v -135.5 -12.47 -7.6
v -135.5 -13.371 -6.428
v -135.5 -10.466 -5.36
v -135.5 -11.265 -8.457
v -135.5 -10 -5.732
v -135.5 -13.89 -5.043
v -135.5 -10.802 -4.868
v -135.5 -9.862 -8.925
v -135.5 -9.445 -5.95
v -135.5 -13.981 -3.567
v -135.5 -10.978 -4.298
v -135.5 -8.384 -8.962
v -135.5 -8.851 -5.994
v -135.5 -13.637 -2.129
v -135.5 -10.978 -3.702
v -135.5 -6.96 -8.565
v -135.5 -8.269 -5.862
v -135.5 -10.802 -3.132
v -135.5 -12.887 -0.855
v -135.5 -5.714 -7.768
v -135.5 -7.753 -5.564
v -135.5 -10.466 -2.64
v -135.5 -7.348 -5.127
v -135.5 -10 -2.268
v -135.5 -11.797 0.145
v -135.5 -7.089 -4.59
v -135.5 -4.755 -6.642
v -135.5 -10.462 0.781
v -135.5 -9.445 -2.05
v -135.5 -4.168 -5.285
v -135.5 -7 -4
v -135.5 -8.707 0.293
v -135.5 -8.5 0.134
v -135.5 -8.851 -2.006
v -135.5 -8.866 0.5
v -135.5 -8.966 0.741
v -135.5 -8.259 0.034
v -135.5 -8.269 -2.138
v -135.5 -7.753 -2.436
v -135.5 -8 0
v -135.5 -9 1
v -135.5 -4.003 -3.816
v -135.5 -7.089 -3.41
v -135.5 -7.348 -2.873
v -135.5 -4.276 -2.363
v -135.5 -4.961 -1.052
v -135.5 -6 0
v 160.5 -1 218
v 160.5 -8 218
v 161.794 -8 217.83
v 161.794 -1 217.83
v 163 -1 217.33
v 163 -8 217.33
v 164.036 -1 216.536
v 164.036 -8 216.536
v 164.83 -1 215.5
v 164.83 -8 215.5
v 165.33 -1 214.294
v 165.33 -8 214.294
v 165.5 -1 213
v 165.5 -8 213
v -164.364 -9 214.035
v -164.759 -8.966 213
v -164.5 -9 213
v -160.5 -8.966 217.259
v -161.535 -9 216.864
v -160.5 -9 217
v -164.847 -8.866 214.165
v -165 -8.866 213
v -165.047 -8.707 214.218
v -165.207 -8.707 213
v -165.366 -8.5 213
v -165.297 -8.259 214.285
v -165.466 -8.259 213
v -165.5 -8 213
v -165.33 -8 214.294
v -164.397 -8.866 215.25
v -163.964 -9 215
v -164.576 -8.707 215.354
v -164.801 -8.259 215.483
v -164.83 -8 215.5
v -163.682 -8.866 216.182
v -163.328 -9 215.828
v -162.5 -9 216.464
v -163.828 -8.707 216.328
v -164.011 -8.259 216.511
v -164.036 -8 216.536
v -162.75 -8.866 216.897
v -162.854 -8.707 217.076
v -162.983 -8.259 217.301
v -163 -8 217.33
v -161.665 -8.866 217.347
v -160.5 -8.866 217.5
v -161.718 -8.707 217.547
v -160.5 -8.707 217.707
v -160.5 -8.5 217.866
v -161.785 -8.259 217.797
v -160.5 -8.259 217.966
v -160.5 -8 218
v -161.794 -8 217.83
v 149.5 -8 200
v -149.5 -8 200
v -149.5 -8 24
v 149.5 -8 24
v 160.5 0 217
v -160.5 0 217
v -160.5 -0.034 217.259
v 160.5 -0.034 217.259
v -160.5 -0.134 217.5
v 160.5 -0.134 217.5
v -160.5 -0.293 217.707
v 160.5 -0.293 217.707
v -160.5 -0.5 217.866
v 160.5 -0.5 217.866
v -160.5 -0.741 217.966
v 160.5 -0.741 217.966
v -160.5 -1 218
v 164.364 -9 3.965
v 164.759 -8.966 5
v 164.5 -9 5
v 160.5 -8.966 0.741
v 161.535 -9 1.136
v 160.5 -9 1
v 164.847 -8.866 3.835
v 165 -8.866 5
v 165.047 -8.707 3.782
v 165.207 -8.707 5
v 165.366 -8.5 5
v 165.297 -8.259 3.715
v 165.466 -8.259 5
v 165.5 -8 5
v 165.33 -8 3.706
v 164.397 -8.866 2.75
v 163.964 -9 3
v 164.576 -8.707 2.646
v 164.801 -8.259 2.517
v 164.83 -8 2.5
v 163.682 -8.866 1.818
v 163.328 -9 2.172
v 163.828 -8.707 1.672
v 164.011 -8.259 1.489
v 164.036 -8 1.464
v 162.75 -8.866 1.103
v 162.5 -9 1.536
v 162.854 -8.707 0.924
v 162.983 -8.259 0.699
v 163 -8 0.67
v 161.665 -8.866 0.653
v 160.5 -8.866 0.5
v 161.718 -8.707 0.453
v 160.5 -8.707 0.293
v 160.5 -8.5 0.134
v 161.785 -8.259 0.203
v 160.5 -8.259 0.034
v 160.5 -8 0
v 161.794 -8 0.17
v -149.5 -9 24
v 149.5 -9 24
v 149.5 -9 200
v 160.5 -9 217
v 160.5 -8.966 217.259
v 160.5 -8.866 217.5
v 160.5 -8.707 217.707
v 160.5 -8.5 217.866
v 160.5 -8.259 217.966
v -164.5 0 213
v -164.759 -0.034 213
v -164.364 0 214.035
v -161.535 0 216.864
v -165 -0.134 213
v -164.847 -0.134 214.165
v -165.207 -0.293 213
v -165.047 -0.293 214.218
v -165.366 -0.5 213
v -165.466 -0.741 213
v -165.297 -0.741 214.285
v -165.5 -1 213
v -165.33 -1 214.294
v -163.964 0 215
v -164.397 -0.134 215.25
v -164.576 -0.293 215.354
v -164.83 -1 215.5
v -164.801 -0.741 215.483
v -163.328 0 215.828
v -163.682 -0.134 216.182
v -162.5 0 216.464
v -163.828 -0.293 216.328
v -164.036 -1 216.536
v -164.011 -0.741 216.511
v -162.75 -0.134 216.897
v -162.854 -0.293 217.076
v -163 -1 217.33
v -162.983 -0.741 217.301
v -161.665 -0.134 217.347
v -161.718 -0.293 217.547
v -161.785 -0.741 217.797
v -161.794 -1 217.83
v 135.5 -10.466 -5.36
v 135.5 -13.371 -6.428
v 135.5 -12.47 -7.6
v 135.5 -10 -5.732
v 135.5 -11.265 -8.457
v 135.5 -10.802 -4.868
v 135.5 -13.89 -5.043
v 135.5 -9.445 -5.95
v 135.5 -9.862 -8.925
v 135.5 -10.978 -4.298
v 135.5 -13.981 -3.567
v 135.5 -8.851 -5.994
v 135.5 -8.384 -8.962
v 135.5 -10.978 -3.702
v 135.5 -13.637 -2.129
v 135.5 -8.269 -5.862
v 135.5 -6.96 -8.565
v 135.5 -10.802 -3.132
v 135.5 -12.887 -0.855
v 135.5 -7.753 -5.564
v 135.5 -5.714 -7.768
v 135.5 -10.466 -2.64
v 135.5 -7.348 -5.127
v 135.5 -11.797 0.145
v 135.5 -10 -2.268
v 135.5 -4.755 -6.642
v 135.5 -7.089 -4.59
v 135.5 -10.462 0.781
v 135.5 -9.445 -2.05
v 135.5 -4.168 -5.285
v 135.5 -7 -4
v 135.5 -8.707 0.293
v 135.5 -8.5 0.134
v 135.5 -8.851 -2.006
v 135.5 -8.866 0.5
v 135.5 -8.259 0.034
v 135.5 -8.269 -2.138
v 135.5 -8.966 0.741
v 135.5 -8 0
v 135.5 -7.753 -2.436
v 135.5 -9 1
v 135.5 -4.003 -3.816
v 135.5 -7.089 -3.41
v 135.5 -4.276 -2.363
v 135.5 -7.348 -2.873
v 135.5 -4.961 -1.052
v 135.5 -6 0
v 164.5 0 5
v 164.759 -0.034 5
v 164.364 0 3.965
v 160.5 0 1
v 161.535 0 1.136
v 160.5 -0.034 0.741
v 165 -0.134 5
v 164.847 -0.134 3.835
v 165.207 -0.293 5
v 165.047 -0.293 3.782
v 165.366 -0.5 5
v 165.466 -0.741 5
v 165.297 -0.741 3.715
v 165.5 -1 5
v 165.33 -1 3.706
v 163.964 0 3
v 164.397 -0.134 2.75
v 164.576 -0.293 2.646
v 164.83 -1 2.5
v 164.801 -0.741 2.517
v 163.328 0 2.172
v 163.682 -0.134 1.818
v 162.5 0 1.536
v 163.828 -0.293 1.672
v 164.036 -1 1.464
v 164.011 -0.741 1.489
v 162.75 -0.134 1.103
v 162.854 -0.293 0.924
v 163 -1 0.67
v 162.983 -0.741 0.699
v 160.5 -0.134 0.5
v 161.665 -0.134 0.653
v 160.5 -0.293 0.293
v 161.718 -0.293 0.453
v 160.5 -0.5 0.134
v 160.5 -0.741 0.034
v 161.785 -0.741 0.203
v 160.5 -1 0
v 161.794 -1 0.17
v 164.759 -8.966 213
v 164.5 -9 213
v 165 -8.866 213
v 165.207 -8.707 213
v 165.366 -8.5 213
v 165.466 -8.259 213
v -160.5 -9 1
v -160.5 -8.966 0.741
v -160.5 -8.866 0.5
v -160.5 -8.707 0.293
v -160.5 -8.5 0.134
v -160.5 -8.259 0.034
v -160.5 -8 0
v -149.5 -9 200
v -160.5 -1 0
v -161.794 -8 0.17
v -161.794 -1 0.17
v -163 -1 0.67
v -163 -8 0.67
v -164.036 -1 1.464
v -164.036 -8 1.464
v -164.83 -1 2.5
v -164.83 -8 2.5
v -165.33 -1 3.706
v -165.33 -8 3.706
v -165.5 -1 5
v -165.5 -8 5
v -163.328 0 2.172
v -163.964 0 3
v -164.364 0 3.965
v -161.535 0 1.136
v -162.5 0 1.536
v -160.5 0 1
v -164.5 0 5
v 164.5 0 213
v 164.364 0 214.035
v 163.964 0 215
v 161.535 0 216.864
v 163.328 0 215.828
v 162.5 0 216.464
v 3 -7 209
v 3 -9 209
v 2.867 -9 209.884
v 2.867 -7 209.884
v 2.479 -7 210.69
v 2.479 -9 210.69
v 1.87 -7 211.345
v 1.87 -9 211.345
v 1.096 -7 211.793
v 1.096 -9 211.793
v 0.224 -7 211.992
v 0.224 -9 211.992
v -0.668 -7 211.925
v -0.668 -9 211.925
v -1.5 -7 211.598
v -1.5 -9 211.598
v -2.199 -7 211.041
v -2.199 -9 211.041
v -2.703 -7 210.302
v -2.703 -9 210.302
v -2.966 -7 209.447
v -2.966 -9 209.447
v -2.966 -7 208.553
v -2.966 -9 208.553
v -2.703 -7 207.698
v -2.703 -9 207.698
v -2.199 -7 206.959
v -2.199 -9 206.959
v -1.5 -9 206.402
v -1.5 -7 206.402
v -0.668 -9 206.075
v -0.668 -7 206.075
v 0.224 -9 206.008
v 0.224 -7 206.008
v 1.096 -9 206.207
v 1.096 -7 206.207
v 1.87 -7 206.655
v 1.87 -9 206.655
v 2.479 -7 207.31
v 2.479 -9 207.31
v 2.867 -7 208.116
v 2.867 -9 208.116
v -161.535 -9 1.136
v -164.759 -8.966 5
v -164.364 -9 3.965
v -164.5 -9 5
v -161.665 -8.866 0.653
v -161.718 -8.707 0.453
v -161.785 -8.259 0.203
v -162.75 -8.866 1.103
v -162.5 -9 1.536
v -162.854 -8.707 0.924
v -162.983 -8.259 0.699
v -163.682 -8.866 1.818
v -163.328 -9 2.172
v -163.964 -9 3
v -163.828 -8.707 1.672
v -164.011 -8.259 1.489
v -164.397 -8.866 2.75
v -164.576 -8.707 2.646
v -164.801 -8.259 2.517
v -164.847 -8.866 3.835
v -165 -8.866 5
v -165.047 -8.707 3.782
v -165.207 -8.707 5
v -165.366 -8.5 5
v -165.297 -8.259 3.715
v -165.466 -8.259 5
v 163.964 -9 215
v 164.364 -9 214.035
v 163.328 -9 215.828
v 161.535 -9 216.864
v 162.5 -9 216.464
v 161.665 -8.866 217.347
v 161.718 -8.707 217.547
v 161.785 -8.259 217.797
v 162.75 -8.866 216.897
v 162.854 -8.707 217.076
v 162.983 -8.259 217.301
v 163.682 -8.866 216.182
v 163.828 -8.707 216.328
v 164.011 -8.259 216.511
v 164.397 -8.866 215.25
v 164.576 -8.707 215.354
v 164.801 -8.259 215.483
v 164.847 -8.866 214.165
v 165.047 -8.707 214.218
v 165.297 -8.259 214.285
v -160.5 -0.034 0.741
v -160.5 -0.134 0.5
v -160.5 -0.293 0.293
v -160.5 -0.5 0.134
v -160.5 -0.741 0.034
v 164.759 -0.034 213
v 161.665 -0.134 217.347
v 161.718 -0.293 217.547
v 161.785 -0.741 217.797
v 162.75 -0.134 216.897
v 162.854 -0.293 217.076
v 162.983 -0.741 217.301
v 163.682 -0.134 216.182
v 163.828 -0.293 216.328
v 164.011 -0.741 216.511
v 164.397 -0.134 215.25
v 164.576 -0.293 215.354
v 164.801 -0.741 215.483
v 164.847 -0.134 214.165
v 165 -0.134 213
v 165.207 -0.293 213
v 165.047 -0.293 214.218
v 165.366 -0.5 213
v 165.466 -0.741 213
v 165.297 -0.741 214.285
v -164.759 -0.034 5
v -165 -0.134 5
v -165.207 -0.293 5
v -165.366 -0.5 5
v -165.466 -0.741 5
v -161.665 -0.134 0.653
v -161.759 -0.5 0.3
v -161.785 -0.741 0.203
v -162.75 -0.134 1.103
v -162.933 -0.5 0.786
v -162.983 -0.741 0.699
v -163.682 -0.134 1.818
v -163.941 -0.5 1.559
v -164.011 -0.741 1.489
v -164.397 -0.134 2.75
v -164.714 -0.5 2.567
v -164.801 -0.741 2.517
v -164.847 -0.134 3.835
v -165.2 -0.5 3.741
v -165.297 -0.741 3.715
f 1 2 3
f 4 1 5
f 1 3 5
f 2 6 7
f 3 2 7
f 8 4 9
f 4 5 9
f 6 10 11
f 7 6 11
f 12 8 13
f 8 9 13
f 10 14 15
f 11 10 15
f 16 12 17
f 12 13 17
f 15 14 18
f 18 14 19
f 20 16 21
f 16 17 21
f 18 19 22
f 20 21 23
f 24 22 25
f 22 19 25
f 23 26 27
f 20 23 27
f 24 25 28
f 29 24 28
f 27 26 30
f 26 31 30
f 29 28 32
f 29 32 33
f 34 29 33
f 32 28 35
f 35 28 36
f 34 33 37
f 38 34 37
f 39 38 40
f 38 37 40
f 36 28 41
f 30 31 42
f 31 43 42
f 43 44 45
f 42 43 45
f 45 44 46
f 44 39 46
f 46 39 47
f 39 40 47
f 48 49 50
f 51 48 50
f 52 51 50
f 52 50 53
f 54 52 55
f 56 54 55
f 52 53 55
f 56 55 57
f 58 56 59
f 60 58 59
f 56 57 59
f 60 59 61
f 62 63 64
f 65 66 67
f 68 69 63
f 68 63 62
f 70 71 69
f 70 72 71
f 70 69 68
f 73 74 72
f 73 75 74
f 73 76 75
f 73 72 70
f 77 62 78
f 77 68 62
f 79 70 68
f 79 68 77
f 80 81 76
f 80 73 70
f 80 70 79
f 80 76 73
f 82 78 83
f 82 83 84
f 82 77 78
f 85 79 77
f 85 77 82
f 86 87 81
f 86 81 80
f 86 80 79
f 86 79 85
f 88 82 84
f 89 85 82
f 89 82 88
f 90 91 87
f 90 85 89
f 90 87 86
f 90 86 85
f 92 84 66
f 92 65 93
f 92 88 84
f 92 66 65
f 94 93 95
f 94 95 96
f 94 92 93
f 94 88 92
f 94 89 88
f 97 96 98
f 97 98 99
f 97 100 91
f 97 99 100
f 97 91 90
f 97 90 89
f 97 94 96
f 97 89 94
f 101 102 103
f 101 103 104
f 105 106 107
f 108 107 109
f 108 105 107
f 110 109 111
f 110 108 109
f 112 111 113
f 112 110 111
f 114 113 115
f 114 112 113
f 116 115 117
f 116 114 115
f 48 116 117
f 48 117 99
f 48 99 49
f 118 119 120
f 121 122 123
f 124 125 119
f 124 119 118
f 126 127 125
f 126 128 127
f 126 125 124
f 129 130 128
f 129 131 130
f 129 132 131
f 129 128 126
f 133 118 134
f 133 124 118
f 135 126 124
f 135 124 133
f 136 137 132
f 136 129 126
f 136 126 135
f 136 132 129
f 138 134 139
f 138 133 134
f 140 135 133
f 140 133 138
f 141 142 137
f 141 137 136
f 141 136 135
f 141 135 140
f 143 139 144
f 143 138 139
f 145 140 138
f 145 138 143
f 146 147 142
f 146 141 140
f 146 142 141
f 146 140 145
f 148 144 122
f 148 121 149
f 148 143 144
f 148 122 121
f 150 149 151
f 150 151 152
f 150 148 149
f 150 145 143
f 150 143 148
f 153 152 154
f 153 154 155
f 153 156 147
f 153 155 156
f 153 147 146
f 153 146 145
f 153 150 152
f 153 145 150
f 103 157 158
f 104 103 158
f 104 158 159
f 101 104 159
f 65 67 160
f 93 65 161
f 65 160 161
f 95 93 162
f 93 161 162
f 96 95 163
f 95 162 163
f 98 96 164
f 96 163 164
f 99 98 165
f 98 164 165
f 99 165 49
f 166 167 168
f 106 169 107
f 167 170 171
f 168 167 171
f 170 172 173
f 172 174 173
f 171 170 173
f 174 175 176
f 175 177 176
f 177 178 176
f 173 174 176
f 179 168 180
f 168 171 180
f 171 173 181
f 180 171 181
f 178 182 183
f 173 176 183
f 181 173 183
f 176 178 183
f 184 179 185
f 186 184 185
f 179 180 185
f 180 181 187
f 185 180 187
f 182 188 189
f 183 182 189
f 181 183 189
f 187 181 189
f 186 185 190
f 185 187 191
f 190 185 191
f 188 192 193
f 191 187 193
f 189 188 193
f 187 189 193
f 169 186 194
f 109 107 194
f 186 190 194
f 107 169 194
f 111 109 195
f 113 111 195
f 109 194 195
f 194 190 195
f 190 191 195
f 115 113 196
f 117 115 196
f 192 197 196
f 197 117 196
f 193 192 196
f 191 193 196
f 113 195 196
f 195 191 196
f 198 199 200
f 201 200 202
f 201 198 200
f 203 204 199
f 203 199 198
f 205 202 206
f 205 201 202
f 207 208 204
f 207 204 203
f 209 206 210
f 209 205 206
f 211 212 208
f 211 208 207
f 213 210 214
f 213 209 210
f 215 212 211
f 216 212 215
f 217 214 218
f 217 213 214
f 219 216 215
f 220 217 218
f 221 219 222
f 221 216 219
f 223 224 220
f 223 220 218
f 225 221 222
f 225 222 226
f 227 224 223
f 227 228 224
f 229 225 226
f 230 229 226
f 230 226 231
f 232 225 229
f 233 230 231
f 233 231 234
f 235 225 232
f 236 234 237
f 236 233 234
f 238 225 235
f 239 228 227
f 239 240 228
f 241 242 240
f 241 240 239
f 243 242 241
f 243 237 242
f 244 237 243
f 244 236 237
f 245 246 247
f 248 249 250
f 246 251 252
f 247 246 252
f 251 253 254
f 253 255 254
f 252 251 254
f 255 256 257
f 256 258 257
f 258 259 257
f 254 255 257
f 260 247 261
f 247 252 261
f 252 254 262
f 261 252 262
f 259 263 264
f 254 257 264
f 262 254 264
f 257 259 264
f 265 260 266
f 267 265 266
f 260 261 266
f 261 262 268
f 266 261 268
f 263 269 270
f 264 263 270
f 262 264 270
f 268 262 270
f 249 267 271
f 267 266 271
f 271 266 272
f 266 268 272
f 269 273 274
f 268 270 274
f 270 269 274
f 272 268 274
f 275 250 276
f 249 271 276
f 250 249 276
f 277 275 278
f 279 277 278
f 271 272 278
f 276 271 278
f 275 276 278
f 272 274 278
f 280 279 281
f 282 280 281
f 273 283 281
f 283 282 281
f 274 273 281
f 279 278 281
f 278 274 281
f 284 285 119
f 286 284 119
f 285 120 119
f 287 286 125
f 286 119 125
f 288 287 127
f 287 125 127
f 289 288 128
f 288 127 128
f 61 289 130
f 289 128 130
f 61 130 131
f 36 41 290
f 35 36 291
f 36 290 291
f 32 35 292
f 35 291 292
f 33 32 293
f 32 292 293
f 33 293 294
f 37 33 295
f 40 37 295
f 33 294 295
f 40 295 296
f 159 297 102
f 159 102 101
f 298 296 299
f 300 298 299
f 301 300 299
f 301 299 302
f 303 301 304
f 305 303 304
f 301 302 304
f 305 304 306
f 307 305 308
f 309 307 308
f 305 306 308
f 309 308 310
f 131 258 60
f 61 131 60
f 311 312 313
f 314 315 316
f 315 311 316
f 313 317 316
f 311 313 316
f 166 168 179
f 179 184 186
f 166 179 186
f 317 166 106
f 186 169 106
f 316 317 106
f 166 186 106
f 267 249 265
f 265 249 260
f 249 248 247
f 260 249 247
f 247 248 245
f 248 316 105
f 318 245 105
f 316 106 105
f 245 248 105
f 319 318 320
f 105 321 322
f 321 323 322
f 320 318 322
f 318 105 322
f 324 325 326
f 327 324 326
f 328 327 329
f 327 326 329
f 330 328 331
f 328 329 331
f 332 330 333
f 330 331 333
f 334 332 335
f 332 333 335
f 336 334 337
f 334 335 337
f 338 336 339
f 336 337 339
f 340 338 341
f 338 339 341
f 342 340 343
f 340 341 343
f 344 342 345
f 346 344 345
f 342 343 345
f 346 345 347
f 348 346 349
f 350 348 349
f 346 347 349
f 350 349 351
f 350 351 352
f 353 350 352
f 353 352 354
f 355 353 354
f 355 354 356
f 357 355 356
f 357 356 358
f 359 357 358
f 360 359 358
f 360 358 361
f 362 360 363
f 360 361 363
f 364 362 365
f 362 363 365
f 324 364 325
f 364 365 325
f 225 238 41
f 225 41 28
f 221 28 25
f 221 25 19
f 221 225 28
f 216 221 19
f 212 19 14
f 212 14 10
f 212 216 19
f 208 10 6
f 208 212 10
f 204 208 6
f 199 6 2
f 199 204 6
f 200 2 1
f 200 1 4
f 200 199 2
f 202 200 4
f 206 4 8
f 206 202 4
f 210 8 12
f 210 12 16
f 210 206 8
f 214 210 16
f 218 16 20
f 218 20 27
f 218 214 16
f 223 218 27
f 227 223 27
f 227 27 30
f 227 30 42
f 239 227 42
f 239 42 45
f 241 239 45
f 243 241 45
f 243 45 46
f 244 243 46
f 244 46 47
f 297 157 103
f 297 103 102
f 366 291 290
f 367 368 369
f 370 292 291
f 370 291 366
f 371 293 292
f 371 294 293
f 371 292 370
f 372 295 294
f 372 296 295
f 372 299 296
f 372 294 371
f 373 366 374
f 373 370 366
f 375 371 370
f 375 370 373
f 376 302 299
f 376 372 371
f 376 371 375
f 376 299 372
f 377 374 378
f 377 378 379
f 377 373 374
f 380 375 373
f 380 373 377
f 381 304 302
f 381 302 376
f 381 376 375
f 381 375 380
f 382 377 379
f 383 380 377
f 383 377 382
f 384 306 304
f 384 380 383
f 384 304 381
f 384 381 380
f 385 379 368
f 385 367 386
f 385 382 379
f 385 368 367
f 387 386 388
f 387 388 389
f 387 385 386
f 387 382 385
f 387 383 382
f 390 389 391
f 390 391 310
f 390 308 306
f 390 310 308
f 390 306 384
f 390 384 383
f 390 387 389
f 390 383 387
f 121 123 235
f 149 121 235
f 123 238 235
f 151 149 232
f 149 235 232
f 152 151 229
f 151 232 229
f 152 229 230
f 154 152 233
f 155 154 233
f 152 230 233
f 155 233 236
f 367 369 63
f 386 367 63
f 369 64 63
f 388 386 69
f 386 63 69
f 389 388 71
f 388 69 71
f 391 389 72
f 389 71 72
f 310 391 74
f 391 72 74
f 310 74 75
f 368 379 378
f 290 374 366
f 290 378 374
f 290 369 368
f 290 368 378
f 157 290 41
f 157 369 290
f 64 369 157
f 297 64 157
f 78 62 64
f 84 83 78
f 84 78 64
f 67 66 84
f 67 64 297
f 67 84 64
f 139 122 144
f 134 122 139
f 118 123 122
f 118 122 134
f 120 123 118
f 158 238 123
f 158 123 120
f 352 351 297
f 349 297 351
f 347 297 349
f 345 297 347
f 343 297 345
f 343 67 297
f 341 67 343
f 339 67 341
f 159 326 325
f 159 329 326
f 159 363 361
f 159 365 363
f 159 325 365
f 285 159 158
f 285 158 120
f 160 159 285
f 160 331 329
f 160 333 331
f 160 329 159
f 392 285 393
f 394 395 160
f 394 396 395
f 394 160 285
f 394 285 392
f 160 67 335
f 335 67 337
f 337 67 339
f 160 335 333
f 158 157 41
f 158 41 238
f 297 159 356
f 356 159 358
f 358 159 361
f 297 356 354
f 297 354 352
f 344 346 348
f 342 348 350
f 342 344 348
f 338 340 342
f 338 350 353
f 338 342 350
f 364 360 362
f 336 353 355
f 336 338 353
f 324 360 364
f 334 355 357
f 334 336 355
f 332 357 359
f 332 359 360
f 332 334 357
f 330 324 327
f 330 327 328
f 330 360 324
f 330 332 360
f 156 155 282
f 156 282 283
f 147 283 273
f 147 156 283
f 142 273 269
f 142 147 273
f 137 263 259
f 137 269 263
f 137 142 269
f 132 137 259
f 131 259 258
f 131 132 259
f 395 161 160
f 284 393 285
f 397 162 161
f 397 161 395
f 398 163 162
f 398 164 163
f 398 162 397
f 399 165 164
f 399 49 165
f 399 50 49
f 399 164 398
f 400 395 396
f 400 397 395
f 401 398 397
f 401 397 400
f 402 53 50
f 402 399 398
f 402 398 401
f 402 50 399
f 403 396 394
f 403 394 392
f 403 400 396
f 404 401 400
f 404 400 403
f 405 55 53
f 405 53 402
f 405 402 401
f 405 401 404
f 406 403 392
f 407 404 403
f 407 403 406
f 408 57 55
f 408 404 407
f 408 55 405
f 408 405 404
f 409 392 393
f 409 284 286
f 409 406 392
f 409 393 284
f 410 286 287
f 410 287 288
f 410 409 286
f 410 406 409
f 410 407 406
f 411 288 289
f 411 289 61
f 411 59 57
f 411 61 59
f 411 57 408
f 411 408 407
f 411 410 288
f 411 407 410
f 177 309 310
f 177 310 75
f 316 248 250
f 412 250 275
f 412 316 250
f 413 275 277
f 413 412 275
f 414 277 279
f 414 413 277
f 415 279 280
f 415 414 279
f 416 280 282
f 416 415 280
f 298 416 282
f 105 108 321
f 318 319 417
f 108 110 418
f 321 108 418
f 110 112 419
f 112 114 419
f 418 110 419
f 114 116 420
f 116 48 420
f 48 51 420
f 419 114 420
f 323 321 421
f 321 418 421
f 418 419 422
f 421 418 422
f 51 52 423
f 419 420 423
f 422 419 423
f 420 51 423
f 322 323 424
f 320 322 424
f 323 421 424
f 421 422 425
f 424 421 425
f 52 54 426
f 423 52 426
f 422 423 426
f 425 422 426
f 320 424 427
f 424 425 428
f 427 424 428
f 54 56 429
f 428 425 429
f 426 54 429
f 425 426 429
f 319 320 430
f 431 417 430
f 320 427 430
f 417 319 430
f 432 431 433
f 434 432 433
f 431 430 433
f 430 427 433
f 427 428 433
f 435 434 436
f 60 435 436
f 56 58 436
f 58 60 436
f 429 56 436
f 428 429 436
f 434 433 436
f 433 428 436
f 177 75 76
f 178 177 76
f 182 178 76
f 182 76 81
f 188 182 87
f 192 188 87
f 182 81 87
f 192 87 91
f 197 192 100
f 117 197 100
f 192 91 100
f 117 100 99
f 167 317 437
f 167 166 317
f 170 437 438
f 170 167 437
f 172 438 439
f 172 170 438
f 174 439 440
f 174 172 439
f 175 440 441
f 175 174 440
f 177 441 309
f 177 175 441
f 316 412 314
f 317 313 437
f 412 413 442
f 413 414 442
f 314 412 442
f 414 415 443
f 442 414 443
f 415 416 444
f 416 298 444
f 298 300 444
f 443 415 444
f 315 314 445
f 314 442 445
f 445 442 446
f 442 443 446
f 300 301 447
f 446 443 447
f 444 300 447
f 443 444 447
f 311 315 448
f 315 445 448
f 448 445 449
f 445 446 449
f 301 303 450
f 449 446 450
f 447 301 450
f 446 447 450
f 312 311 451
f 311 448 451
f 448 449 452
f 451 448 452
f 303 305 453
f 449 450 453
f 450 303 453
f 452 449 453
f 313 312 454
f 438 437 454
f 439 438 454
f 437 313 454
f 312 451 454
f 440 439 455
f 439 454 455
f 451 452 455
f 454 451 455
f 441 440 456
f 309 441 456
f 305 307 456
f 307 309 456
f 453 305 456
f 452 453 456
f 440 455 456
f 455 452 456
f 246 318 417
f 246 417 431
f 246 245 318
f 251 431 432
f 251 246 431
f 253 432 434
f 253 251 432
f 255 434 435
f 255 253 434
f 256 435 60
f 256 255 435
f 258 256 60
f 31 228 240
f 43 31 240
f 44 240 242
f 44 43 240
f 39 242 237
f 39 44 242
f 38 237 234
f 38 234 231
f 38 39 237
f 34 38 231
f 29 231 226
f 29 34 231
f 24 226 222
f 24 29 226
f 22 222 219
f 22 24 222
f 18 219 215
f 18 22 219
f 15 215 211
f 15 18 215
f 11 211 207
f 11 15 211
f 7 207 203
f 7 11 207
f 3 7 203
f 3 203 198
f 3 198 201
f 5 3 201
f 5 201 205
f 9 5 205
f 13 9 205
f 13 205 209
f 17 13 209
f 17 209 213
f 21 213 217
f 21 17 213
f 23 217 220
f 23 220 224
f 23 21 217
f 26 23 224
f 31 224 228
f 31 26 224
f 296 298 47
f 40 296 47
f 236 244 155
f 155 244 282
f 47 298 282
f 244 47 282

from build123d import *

# Parameters (mm, degrees)
F0_W     = 331
F0_H     = 218
F1_DEPTH = 9
F2_W     = 299
F2_H     = 176
F3_DEPTH = 1
F4_R     = 3
F5_DEPTH = 2
F6_R     = 5
F6_R_2   = 2
F7_DEPTH = 135.5
F8_R     = 5
F9_R     = 1


with BuildPart() as f1:
    # F0 (on Front) → F1 (new body)
    with BuildSketch(Plane.XZ):
        with Locations((0, 109)):
            Rectangle(F0_W, F0_H)
    extrude(amount=F1_DEPTH)

    # F2 (on face) → F3 (cut)
    with BuildSketch(Plane.XZ.offset(9)):
        with Locations((0, 112)):
            Rectangle(F2_W, F2_H)
    extrude(amount=-F3_DEPTH, mode=Mode.SUBTRACT)

    # F4 (on face) → F5 (cut)
    with BuildSketch(Plane.XZ.offset(9)):
        with Locations((0, 209)):
            Circle(F4_R)
    extrude(amount=-F5_DEPTH, mode=Mode.SUBTRACT)

    # F6 (on Right) → F7 (join, symmetric)
    with BuildSketch(Plane.YZ):
        with Locations((-9, -4)):
            Circle(F6_R)
        with Locations((-9, -4)):
            Circle(F6_R_2, mode=Mode.SUBTRACT)
    extrude(amount=F7_DEPTH, both=True)

    # F8
    f8_edges = [f1.edges().sort_by_distance(p)[0] for p in [
        (165.5, -4.5, 0),
        (165.5, -4.5, 218),
        (-165.5, -4.5, 218),
        (-165.5, -4.5, 0),
    ]]
    fillet(f8_edges, radius=F8_R)

    # F9
    f9_edges = [f1.edges().sort_by_distance(p)[0] for p in [
        (-165.5, -9, 109),
        (-165.5, 0, 109),
    ]]
    fillet(f9_edges, radius=F9_R)


solid = f1.part
